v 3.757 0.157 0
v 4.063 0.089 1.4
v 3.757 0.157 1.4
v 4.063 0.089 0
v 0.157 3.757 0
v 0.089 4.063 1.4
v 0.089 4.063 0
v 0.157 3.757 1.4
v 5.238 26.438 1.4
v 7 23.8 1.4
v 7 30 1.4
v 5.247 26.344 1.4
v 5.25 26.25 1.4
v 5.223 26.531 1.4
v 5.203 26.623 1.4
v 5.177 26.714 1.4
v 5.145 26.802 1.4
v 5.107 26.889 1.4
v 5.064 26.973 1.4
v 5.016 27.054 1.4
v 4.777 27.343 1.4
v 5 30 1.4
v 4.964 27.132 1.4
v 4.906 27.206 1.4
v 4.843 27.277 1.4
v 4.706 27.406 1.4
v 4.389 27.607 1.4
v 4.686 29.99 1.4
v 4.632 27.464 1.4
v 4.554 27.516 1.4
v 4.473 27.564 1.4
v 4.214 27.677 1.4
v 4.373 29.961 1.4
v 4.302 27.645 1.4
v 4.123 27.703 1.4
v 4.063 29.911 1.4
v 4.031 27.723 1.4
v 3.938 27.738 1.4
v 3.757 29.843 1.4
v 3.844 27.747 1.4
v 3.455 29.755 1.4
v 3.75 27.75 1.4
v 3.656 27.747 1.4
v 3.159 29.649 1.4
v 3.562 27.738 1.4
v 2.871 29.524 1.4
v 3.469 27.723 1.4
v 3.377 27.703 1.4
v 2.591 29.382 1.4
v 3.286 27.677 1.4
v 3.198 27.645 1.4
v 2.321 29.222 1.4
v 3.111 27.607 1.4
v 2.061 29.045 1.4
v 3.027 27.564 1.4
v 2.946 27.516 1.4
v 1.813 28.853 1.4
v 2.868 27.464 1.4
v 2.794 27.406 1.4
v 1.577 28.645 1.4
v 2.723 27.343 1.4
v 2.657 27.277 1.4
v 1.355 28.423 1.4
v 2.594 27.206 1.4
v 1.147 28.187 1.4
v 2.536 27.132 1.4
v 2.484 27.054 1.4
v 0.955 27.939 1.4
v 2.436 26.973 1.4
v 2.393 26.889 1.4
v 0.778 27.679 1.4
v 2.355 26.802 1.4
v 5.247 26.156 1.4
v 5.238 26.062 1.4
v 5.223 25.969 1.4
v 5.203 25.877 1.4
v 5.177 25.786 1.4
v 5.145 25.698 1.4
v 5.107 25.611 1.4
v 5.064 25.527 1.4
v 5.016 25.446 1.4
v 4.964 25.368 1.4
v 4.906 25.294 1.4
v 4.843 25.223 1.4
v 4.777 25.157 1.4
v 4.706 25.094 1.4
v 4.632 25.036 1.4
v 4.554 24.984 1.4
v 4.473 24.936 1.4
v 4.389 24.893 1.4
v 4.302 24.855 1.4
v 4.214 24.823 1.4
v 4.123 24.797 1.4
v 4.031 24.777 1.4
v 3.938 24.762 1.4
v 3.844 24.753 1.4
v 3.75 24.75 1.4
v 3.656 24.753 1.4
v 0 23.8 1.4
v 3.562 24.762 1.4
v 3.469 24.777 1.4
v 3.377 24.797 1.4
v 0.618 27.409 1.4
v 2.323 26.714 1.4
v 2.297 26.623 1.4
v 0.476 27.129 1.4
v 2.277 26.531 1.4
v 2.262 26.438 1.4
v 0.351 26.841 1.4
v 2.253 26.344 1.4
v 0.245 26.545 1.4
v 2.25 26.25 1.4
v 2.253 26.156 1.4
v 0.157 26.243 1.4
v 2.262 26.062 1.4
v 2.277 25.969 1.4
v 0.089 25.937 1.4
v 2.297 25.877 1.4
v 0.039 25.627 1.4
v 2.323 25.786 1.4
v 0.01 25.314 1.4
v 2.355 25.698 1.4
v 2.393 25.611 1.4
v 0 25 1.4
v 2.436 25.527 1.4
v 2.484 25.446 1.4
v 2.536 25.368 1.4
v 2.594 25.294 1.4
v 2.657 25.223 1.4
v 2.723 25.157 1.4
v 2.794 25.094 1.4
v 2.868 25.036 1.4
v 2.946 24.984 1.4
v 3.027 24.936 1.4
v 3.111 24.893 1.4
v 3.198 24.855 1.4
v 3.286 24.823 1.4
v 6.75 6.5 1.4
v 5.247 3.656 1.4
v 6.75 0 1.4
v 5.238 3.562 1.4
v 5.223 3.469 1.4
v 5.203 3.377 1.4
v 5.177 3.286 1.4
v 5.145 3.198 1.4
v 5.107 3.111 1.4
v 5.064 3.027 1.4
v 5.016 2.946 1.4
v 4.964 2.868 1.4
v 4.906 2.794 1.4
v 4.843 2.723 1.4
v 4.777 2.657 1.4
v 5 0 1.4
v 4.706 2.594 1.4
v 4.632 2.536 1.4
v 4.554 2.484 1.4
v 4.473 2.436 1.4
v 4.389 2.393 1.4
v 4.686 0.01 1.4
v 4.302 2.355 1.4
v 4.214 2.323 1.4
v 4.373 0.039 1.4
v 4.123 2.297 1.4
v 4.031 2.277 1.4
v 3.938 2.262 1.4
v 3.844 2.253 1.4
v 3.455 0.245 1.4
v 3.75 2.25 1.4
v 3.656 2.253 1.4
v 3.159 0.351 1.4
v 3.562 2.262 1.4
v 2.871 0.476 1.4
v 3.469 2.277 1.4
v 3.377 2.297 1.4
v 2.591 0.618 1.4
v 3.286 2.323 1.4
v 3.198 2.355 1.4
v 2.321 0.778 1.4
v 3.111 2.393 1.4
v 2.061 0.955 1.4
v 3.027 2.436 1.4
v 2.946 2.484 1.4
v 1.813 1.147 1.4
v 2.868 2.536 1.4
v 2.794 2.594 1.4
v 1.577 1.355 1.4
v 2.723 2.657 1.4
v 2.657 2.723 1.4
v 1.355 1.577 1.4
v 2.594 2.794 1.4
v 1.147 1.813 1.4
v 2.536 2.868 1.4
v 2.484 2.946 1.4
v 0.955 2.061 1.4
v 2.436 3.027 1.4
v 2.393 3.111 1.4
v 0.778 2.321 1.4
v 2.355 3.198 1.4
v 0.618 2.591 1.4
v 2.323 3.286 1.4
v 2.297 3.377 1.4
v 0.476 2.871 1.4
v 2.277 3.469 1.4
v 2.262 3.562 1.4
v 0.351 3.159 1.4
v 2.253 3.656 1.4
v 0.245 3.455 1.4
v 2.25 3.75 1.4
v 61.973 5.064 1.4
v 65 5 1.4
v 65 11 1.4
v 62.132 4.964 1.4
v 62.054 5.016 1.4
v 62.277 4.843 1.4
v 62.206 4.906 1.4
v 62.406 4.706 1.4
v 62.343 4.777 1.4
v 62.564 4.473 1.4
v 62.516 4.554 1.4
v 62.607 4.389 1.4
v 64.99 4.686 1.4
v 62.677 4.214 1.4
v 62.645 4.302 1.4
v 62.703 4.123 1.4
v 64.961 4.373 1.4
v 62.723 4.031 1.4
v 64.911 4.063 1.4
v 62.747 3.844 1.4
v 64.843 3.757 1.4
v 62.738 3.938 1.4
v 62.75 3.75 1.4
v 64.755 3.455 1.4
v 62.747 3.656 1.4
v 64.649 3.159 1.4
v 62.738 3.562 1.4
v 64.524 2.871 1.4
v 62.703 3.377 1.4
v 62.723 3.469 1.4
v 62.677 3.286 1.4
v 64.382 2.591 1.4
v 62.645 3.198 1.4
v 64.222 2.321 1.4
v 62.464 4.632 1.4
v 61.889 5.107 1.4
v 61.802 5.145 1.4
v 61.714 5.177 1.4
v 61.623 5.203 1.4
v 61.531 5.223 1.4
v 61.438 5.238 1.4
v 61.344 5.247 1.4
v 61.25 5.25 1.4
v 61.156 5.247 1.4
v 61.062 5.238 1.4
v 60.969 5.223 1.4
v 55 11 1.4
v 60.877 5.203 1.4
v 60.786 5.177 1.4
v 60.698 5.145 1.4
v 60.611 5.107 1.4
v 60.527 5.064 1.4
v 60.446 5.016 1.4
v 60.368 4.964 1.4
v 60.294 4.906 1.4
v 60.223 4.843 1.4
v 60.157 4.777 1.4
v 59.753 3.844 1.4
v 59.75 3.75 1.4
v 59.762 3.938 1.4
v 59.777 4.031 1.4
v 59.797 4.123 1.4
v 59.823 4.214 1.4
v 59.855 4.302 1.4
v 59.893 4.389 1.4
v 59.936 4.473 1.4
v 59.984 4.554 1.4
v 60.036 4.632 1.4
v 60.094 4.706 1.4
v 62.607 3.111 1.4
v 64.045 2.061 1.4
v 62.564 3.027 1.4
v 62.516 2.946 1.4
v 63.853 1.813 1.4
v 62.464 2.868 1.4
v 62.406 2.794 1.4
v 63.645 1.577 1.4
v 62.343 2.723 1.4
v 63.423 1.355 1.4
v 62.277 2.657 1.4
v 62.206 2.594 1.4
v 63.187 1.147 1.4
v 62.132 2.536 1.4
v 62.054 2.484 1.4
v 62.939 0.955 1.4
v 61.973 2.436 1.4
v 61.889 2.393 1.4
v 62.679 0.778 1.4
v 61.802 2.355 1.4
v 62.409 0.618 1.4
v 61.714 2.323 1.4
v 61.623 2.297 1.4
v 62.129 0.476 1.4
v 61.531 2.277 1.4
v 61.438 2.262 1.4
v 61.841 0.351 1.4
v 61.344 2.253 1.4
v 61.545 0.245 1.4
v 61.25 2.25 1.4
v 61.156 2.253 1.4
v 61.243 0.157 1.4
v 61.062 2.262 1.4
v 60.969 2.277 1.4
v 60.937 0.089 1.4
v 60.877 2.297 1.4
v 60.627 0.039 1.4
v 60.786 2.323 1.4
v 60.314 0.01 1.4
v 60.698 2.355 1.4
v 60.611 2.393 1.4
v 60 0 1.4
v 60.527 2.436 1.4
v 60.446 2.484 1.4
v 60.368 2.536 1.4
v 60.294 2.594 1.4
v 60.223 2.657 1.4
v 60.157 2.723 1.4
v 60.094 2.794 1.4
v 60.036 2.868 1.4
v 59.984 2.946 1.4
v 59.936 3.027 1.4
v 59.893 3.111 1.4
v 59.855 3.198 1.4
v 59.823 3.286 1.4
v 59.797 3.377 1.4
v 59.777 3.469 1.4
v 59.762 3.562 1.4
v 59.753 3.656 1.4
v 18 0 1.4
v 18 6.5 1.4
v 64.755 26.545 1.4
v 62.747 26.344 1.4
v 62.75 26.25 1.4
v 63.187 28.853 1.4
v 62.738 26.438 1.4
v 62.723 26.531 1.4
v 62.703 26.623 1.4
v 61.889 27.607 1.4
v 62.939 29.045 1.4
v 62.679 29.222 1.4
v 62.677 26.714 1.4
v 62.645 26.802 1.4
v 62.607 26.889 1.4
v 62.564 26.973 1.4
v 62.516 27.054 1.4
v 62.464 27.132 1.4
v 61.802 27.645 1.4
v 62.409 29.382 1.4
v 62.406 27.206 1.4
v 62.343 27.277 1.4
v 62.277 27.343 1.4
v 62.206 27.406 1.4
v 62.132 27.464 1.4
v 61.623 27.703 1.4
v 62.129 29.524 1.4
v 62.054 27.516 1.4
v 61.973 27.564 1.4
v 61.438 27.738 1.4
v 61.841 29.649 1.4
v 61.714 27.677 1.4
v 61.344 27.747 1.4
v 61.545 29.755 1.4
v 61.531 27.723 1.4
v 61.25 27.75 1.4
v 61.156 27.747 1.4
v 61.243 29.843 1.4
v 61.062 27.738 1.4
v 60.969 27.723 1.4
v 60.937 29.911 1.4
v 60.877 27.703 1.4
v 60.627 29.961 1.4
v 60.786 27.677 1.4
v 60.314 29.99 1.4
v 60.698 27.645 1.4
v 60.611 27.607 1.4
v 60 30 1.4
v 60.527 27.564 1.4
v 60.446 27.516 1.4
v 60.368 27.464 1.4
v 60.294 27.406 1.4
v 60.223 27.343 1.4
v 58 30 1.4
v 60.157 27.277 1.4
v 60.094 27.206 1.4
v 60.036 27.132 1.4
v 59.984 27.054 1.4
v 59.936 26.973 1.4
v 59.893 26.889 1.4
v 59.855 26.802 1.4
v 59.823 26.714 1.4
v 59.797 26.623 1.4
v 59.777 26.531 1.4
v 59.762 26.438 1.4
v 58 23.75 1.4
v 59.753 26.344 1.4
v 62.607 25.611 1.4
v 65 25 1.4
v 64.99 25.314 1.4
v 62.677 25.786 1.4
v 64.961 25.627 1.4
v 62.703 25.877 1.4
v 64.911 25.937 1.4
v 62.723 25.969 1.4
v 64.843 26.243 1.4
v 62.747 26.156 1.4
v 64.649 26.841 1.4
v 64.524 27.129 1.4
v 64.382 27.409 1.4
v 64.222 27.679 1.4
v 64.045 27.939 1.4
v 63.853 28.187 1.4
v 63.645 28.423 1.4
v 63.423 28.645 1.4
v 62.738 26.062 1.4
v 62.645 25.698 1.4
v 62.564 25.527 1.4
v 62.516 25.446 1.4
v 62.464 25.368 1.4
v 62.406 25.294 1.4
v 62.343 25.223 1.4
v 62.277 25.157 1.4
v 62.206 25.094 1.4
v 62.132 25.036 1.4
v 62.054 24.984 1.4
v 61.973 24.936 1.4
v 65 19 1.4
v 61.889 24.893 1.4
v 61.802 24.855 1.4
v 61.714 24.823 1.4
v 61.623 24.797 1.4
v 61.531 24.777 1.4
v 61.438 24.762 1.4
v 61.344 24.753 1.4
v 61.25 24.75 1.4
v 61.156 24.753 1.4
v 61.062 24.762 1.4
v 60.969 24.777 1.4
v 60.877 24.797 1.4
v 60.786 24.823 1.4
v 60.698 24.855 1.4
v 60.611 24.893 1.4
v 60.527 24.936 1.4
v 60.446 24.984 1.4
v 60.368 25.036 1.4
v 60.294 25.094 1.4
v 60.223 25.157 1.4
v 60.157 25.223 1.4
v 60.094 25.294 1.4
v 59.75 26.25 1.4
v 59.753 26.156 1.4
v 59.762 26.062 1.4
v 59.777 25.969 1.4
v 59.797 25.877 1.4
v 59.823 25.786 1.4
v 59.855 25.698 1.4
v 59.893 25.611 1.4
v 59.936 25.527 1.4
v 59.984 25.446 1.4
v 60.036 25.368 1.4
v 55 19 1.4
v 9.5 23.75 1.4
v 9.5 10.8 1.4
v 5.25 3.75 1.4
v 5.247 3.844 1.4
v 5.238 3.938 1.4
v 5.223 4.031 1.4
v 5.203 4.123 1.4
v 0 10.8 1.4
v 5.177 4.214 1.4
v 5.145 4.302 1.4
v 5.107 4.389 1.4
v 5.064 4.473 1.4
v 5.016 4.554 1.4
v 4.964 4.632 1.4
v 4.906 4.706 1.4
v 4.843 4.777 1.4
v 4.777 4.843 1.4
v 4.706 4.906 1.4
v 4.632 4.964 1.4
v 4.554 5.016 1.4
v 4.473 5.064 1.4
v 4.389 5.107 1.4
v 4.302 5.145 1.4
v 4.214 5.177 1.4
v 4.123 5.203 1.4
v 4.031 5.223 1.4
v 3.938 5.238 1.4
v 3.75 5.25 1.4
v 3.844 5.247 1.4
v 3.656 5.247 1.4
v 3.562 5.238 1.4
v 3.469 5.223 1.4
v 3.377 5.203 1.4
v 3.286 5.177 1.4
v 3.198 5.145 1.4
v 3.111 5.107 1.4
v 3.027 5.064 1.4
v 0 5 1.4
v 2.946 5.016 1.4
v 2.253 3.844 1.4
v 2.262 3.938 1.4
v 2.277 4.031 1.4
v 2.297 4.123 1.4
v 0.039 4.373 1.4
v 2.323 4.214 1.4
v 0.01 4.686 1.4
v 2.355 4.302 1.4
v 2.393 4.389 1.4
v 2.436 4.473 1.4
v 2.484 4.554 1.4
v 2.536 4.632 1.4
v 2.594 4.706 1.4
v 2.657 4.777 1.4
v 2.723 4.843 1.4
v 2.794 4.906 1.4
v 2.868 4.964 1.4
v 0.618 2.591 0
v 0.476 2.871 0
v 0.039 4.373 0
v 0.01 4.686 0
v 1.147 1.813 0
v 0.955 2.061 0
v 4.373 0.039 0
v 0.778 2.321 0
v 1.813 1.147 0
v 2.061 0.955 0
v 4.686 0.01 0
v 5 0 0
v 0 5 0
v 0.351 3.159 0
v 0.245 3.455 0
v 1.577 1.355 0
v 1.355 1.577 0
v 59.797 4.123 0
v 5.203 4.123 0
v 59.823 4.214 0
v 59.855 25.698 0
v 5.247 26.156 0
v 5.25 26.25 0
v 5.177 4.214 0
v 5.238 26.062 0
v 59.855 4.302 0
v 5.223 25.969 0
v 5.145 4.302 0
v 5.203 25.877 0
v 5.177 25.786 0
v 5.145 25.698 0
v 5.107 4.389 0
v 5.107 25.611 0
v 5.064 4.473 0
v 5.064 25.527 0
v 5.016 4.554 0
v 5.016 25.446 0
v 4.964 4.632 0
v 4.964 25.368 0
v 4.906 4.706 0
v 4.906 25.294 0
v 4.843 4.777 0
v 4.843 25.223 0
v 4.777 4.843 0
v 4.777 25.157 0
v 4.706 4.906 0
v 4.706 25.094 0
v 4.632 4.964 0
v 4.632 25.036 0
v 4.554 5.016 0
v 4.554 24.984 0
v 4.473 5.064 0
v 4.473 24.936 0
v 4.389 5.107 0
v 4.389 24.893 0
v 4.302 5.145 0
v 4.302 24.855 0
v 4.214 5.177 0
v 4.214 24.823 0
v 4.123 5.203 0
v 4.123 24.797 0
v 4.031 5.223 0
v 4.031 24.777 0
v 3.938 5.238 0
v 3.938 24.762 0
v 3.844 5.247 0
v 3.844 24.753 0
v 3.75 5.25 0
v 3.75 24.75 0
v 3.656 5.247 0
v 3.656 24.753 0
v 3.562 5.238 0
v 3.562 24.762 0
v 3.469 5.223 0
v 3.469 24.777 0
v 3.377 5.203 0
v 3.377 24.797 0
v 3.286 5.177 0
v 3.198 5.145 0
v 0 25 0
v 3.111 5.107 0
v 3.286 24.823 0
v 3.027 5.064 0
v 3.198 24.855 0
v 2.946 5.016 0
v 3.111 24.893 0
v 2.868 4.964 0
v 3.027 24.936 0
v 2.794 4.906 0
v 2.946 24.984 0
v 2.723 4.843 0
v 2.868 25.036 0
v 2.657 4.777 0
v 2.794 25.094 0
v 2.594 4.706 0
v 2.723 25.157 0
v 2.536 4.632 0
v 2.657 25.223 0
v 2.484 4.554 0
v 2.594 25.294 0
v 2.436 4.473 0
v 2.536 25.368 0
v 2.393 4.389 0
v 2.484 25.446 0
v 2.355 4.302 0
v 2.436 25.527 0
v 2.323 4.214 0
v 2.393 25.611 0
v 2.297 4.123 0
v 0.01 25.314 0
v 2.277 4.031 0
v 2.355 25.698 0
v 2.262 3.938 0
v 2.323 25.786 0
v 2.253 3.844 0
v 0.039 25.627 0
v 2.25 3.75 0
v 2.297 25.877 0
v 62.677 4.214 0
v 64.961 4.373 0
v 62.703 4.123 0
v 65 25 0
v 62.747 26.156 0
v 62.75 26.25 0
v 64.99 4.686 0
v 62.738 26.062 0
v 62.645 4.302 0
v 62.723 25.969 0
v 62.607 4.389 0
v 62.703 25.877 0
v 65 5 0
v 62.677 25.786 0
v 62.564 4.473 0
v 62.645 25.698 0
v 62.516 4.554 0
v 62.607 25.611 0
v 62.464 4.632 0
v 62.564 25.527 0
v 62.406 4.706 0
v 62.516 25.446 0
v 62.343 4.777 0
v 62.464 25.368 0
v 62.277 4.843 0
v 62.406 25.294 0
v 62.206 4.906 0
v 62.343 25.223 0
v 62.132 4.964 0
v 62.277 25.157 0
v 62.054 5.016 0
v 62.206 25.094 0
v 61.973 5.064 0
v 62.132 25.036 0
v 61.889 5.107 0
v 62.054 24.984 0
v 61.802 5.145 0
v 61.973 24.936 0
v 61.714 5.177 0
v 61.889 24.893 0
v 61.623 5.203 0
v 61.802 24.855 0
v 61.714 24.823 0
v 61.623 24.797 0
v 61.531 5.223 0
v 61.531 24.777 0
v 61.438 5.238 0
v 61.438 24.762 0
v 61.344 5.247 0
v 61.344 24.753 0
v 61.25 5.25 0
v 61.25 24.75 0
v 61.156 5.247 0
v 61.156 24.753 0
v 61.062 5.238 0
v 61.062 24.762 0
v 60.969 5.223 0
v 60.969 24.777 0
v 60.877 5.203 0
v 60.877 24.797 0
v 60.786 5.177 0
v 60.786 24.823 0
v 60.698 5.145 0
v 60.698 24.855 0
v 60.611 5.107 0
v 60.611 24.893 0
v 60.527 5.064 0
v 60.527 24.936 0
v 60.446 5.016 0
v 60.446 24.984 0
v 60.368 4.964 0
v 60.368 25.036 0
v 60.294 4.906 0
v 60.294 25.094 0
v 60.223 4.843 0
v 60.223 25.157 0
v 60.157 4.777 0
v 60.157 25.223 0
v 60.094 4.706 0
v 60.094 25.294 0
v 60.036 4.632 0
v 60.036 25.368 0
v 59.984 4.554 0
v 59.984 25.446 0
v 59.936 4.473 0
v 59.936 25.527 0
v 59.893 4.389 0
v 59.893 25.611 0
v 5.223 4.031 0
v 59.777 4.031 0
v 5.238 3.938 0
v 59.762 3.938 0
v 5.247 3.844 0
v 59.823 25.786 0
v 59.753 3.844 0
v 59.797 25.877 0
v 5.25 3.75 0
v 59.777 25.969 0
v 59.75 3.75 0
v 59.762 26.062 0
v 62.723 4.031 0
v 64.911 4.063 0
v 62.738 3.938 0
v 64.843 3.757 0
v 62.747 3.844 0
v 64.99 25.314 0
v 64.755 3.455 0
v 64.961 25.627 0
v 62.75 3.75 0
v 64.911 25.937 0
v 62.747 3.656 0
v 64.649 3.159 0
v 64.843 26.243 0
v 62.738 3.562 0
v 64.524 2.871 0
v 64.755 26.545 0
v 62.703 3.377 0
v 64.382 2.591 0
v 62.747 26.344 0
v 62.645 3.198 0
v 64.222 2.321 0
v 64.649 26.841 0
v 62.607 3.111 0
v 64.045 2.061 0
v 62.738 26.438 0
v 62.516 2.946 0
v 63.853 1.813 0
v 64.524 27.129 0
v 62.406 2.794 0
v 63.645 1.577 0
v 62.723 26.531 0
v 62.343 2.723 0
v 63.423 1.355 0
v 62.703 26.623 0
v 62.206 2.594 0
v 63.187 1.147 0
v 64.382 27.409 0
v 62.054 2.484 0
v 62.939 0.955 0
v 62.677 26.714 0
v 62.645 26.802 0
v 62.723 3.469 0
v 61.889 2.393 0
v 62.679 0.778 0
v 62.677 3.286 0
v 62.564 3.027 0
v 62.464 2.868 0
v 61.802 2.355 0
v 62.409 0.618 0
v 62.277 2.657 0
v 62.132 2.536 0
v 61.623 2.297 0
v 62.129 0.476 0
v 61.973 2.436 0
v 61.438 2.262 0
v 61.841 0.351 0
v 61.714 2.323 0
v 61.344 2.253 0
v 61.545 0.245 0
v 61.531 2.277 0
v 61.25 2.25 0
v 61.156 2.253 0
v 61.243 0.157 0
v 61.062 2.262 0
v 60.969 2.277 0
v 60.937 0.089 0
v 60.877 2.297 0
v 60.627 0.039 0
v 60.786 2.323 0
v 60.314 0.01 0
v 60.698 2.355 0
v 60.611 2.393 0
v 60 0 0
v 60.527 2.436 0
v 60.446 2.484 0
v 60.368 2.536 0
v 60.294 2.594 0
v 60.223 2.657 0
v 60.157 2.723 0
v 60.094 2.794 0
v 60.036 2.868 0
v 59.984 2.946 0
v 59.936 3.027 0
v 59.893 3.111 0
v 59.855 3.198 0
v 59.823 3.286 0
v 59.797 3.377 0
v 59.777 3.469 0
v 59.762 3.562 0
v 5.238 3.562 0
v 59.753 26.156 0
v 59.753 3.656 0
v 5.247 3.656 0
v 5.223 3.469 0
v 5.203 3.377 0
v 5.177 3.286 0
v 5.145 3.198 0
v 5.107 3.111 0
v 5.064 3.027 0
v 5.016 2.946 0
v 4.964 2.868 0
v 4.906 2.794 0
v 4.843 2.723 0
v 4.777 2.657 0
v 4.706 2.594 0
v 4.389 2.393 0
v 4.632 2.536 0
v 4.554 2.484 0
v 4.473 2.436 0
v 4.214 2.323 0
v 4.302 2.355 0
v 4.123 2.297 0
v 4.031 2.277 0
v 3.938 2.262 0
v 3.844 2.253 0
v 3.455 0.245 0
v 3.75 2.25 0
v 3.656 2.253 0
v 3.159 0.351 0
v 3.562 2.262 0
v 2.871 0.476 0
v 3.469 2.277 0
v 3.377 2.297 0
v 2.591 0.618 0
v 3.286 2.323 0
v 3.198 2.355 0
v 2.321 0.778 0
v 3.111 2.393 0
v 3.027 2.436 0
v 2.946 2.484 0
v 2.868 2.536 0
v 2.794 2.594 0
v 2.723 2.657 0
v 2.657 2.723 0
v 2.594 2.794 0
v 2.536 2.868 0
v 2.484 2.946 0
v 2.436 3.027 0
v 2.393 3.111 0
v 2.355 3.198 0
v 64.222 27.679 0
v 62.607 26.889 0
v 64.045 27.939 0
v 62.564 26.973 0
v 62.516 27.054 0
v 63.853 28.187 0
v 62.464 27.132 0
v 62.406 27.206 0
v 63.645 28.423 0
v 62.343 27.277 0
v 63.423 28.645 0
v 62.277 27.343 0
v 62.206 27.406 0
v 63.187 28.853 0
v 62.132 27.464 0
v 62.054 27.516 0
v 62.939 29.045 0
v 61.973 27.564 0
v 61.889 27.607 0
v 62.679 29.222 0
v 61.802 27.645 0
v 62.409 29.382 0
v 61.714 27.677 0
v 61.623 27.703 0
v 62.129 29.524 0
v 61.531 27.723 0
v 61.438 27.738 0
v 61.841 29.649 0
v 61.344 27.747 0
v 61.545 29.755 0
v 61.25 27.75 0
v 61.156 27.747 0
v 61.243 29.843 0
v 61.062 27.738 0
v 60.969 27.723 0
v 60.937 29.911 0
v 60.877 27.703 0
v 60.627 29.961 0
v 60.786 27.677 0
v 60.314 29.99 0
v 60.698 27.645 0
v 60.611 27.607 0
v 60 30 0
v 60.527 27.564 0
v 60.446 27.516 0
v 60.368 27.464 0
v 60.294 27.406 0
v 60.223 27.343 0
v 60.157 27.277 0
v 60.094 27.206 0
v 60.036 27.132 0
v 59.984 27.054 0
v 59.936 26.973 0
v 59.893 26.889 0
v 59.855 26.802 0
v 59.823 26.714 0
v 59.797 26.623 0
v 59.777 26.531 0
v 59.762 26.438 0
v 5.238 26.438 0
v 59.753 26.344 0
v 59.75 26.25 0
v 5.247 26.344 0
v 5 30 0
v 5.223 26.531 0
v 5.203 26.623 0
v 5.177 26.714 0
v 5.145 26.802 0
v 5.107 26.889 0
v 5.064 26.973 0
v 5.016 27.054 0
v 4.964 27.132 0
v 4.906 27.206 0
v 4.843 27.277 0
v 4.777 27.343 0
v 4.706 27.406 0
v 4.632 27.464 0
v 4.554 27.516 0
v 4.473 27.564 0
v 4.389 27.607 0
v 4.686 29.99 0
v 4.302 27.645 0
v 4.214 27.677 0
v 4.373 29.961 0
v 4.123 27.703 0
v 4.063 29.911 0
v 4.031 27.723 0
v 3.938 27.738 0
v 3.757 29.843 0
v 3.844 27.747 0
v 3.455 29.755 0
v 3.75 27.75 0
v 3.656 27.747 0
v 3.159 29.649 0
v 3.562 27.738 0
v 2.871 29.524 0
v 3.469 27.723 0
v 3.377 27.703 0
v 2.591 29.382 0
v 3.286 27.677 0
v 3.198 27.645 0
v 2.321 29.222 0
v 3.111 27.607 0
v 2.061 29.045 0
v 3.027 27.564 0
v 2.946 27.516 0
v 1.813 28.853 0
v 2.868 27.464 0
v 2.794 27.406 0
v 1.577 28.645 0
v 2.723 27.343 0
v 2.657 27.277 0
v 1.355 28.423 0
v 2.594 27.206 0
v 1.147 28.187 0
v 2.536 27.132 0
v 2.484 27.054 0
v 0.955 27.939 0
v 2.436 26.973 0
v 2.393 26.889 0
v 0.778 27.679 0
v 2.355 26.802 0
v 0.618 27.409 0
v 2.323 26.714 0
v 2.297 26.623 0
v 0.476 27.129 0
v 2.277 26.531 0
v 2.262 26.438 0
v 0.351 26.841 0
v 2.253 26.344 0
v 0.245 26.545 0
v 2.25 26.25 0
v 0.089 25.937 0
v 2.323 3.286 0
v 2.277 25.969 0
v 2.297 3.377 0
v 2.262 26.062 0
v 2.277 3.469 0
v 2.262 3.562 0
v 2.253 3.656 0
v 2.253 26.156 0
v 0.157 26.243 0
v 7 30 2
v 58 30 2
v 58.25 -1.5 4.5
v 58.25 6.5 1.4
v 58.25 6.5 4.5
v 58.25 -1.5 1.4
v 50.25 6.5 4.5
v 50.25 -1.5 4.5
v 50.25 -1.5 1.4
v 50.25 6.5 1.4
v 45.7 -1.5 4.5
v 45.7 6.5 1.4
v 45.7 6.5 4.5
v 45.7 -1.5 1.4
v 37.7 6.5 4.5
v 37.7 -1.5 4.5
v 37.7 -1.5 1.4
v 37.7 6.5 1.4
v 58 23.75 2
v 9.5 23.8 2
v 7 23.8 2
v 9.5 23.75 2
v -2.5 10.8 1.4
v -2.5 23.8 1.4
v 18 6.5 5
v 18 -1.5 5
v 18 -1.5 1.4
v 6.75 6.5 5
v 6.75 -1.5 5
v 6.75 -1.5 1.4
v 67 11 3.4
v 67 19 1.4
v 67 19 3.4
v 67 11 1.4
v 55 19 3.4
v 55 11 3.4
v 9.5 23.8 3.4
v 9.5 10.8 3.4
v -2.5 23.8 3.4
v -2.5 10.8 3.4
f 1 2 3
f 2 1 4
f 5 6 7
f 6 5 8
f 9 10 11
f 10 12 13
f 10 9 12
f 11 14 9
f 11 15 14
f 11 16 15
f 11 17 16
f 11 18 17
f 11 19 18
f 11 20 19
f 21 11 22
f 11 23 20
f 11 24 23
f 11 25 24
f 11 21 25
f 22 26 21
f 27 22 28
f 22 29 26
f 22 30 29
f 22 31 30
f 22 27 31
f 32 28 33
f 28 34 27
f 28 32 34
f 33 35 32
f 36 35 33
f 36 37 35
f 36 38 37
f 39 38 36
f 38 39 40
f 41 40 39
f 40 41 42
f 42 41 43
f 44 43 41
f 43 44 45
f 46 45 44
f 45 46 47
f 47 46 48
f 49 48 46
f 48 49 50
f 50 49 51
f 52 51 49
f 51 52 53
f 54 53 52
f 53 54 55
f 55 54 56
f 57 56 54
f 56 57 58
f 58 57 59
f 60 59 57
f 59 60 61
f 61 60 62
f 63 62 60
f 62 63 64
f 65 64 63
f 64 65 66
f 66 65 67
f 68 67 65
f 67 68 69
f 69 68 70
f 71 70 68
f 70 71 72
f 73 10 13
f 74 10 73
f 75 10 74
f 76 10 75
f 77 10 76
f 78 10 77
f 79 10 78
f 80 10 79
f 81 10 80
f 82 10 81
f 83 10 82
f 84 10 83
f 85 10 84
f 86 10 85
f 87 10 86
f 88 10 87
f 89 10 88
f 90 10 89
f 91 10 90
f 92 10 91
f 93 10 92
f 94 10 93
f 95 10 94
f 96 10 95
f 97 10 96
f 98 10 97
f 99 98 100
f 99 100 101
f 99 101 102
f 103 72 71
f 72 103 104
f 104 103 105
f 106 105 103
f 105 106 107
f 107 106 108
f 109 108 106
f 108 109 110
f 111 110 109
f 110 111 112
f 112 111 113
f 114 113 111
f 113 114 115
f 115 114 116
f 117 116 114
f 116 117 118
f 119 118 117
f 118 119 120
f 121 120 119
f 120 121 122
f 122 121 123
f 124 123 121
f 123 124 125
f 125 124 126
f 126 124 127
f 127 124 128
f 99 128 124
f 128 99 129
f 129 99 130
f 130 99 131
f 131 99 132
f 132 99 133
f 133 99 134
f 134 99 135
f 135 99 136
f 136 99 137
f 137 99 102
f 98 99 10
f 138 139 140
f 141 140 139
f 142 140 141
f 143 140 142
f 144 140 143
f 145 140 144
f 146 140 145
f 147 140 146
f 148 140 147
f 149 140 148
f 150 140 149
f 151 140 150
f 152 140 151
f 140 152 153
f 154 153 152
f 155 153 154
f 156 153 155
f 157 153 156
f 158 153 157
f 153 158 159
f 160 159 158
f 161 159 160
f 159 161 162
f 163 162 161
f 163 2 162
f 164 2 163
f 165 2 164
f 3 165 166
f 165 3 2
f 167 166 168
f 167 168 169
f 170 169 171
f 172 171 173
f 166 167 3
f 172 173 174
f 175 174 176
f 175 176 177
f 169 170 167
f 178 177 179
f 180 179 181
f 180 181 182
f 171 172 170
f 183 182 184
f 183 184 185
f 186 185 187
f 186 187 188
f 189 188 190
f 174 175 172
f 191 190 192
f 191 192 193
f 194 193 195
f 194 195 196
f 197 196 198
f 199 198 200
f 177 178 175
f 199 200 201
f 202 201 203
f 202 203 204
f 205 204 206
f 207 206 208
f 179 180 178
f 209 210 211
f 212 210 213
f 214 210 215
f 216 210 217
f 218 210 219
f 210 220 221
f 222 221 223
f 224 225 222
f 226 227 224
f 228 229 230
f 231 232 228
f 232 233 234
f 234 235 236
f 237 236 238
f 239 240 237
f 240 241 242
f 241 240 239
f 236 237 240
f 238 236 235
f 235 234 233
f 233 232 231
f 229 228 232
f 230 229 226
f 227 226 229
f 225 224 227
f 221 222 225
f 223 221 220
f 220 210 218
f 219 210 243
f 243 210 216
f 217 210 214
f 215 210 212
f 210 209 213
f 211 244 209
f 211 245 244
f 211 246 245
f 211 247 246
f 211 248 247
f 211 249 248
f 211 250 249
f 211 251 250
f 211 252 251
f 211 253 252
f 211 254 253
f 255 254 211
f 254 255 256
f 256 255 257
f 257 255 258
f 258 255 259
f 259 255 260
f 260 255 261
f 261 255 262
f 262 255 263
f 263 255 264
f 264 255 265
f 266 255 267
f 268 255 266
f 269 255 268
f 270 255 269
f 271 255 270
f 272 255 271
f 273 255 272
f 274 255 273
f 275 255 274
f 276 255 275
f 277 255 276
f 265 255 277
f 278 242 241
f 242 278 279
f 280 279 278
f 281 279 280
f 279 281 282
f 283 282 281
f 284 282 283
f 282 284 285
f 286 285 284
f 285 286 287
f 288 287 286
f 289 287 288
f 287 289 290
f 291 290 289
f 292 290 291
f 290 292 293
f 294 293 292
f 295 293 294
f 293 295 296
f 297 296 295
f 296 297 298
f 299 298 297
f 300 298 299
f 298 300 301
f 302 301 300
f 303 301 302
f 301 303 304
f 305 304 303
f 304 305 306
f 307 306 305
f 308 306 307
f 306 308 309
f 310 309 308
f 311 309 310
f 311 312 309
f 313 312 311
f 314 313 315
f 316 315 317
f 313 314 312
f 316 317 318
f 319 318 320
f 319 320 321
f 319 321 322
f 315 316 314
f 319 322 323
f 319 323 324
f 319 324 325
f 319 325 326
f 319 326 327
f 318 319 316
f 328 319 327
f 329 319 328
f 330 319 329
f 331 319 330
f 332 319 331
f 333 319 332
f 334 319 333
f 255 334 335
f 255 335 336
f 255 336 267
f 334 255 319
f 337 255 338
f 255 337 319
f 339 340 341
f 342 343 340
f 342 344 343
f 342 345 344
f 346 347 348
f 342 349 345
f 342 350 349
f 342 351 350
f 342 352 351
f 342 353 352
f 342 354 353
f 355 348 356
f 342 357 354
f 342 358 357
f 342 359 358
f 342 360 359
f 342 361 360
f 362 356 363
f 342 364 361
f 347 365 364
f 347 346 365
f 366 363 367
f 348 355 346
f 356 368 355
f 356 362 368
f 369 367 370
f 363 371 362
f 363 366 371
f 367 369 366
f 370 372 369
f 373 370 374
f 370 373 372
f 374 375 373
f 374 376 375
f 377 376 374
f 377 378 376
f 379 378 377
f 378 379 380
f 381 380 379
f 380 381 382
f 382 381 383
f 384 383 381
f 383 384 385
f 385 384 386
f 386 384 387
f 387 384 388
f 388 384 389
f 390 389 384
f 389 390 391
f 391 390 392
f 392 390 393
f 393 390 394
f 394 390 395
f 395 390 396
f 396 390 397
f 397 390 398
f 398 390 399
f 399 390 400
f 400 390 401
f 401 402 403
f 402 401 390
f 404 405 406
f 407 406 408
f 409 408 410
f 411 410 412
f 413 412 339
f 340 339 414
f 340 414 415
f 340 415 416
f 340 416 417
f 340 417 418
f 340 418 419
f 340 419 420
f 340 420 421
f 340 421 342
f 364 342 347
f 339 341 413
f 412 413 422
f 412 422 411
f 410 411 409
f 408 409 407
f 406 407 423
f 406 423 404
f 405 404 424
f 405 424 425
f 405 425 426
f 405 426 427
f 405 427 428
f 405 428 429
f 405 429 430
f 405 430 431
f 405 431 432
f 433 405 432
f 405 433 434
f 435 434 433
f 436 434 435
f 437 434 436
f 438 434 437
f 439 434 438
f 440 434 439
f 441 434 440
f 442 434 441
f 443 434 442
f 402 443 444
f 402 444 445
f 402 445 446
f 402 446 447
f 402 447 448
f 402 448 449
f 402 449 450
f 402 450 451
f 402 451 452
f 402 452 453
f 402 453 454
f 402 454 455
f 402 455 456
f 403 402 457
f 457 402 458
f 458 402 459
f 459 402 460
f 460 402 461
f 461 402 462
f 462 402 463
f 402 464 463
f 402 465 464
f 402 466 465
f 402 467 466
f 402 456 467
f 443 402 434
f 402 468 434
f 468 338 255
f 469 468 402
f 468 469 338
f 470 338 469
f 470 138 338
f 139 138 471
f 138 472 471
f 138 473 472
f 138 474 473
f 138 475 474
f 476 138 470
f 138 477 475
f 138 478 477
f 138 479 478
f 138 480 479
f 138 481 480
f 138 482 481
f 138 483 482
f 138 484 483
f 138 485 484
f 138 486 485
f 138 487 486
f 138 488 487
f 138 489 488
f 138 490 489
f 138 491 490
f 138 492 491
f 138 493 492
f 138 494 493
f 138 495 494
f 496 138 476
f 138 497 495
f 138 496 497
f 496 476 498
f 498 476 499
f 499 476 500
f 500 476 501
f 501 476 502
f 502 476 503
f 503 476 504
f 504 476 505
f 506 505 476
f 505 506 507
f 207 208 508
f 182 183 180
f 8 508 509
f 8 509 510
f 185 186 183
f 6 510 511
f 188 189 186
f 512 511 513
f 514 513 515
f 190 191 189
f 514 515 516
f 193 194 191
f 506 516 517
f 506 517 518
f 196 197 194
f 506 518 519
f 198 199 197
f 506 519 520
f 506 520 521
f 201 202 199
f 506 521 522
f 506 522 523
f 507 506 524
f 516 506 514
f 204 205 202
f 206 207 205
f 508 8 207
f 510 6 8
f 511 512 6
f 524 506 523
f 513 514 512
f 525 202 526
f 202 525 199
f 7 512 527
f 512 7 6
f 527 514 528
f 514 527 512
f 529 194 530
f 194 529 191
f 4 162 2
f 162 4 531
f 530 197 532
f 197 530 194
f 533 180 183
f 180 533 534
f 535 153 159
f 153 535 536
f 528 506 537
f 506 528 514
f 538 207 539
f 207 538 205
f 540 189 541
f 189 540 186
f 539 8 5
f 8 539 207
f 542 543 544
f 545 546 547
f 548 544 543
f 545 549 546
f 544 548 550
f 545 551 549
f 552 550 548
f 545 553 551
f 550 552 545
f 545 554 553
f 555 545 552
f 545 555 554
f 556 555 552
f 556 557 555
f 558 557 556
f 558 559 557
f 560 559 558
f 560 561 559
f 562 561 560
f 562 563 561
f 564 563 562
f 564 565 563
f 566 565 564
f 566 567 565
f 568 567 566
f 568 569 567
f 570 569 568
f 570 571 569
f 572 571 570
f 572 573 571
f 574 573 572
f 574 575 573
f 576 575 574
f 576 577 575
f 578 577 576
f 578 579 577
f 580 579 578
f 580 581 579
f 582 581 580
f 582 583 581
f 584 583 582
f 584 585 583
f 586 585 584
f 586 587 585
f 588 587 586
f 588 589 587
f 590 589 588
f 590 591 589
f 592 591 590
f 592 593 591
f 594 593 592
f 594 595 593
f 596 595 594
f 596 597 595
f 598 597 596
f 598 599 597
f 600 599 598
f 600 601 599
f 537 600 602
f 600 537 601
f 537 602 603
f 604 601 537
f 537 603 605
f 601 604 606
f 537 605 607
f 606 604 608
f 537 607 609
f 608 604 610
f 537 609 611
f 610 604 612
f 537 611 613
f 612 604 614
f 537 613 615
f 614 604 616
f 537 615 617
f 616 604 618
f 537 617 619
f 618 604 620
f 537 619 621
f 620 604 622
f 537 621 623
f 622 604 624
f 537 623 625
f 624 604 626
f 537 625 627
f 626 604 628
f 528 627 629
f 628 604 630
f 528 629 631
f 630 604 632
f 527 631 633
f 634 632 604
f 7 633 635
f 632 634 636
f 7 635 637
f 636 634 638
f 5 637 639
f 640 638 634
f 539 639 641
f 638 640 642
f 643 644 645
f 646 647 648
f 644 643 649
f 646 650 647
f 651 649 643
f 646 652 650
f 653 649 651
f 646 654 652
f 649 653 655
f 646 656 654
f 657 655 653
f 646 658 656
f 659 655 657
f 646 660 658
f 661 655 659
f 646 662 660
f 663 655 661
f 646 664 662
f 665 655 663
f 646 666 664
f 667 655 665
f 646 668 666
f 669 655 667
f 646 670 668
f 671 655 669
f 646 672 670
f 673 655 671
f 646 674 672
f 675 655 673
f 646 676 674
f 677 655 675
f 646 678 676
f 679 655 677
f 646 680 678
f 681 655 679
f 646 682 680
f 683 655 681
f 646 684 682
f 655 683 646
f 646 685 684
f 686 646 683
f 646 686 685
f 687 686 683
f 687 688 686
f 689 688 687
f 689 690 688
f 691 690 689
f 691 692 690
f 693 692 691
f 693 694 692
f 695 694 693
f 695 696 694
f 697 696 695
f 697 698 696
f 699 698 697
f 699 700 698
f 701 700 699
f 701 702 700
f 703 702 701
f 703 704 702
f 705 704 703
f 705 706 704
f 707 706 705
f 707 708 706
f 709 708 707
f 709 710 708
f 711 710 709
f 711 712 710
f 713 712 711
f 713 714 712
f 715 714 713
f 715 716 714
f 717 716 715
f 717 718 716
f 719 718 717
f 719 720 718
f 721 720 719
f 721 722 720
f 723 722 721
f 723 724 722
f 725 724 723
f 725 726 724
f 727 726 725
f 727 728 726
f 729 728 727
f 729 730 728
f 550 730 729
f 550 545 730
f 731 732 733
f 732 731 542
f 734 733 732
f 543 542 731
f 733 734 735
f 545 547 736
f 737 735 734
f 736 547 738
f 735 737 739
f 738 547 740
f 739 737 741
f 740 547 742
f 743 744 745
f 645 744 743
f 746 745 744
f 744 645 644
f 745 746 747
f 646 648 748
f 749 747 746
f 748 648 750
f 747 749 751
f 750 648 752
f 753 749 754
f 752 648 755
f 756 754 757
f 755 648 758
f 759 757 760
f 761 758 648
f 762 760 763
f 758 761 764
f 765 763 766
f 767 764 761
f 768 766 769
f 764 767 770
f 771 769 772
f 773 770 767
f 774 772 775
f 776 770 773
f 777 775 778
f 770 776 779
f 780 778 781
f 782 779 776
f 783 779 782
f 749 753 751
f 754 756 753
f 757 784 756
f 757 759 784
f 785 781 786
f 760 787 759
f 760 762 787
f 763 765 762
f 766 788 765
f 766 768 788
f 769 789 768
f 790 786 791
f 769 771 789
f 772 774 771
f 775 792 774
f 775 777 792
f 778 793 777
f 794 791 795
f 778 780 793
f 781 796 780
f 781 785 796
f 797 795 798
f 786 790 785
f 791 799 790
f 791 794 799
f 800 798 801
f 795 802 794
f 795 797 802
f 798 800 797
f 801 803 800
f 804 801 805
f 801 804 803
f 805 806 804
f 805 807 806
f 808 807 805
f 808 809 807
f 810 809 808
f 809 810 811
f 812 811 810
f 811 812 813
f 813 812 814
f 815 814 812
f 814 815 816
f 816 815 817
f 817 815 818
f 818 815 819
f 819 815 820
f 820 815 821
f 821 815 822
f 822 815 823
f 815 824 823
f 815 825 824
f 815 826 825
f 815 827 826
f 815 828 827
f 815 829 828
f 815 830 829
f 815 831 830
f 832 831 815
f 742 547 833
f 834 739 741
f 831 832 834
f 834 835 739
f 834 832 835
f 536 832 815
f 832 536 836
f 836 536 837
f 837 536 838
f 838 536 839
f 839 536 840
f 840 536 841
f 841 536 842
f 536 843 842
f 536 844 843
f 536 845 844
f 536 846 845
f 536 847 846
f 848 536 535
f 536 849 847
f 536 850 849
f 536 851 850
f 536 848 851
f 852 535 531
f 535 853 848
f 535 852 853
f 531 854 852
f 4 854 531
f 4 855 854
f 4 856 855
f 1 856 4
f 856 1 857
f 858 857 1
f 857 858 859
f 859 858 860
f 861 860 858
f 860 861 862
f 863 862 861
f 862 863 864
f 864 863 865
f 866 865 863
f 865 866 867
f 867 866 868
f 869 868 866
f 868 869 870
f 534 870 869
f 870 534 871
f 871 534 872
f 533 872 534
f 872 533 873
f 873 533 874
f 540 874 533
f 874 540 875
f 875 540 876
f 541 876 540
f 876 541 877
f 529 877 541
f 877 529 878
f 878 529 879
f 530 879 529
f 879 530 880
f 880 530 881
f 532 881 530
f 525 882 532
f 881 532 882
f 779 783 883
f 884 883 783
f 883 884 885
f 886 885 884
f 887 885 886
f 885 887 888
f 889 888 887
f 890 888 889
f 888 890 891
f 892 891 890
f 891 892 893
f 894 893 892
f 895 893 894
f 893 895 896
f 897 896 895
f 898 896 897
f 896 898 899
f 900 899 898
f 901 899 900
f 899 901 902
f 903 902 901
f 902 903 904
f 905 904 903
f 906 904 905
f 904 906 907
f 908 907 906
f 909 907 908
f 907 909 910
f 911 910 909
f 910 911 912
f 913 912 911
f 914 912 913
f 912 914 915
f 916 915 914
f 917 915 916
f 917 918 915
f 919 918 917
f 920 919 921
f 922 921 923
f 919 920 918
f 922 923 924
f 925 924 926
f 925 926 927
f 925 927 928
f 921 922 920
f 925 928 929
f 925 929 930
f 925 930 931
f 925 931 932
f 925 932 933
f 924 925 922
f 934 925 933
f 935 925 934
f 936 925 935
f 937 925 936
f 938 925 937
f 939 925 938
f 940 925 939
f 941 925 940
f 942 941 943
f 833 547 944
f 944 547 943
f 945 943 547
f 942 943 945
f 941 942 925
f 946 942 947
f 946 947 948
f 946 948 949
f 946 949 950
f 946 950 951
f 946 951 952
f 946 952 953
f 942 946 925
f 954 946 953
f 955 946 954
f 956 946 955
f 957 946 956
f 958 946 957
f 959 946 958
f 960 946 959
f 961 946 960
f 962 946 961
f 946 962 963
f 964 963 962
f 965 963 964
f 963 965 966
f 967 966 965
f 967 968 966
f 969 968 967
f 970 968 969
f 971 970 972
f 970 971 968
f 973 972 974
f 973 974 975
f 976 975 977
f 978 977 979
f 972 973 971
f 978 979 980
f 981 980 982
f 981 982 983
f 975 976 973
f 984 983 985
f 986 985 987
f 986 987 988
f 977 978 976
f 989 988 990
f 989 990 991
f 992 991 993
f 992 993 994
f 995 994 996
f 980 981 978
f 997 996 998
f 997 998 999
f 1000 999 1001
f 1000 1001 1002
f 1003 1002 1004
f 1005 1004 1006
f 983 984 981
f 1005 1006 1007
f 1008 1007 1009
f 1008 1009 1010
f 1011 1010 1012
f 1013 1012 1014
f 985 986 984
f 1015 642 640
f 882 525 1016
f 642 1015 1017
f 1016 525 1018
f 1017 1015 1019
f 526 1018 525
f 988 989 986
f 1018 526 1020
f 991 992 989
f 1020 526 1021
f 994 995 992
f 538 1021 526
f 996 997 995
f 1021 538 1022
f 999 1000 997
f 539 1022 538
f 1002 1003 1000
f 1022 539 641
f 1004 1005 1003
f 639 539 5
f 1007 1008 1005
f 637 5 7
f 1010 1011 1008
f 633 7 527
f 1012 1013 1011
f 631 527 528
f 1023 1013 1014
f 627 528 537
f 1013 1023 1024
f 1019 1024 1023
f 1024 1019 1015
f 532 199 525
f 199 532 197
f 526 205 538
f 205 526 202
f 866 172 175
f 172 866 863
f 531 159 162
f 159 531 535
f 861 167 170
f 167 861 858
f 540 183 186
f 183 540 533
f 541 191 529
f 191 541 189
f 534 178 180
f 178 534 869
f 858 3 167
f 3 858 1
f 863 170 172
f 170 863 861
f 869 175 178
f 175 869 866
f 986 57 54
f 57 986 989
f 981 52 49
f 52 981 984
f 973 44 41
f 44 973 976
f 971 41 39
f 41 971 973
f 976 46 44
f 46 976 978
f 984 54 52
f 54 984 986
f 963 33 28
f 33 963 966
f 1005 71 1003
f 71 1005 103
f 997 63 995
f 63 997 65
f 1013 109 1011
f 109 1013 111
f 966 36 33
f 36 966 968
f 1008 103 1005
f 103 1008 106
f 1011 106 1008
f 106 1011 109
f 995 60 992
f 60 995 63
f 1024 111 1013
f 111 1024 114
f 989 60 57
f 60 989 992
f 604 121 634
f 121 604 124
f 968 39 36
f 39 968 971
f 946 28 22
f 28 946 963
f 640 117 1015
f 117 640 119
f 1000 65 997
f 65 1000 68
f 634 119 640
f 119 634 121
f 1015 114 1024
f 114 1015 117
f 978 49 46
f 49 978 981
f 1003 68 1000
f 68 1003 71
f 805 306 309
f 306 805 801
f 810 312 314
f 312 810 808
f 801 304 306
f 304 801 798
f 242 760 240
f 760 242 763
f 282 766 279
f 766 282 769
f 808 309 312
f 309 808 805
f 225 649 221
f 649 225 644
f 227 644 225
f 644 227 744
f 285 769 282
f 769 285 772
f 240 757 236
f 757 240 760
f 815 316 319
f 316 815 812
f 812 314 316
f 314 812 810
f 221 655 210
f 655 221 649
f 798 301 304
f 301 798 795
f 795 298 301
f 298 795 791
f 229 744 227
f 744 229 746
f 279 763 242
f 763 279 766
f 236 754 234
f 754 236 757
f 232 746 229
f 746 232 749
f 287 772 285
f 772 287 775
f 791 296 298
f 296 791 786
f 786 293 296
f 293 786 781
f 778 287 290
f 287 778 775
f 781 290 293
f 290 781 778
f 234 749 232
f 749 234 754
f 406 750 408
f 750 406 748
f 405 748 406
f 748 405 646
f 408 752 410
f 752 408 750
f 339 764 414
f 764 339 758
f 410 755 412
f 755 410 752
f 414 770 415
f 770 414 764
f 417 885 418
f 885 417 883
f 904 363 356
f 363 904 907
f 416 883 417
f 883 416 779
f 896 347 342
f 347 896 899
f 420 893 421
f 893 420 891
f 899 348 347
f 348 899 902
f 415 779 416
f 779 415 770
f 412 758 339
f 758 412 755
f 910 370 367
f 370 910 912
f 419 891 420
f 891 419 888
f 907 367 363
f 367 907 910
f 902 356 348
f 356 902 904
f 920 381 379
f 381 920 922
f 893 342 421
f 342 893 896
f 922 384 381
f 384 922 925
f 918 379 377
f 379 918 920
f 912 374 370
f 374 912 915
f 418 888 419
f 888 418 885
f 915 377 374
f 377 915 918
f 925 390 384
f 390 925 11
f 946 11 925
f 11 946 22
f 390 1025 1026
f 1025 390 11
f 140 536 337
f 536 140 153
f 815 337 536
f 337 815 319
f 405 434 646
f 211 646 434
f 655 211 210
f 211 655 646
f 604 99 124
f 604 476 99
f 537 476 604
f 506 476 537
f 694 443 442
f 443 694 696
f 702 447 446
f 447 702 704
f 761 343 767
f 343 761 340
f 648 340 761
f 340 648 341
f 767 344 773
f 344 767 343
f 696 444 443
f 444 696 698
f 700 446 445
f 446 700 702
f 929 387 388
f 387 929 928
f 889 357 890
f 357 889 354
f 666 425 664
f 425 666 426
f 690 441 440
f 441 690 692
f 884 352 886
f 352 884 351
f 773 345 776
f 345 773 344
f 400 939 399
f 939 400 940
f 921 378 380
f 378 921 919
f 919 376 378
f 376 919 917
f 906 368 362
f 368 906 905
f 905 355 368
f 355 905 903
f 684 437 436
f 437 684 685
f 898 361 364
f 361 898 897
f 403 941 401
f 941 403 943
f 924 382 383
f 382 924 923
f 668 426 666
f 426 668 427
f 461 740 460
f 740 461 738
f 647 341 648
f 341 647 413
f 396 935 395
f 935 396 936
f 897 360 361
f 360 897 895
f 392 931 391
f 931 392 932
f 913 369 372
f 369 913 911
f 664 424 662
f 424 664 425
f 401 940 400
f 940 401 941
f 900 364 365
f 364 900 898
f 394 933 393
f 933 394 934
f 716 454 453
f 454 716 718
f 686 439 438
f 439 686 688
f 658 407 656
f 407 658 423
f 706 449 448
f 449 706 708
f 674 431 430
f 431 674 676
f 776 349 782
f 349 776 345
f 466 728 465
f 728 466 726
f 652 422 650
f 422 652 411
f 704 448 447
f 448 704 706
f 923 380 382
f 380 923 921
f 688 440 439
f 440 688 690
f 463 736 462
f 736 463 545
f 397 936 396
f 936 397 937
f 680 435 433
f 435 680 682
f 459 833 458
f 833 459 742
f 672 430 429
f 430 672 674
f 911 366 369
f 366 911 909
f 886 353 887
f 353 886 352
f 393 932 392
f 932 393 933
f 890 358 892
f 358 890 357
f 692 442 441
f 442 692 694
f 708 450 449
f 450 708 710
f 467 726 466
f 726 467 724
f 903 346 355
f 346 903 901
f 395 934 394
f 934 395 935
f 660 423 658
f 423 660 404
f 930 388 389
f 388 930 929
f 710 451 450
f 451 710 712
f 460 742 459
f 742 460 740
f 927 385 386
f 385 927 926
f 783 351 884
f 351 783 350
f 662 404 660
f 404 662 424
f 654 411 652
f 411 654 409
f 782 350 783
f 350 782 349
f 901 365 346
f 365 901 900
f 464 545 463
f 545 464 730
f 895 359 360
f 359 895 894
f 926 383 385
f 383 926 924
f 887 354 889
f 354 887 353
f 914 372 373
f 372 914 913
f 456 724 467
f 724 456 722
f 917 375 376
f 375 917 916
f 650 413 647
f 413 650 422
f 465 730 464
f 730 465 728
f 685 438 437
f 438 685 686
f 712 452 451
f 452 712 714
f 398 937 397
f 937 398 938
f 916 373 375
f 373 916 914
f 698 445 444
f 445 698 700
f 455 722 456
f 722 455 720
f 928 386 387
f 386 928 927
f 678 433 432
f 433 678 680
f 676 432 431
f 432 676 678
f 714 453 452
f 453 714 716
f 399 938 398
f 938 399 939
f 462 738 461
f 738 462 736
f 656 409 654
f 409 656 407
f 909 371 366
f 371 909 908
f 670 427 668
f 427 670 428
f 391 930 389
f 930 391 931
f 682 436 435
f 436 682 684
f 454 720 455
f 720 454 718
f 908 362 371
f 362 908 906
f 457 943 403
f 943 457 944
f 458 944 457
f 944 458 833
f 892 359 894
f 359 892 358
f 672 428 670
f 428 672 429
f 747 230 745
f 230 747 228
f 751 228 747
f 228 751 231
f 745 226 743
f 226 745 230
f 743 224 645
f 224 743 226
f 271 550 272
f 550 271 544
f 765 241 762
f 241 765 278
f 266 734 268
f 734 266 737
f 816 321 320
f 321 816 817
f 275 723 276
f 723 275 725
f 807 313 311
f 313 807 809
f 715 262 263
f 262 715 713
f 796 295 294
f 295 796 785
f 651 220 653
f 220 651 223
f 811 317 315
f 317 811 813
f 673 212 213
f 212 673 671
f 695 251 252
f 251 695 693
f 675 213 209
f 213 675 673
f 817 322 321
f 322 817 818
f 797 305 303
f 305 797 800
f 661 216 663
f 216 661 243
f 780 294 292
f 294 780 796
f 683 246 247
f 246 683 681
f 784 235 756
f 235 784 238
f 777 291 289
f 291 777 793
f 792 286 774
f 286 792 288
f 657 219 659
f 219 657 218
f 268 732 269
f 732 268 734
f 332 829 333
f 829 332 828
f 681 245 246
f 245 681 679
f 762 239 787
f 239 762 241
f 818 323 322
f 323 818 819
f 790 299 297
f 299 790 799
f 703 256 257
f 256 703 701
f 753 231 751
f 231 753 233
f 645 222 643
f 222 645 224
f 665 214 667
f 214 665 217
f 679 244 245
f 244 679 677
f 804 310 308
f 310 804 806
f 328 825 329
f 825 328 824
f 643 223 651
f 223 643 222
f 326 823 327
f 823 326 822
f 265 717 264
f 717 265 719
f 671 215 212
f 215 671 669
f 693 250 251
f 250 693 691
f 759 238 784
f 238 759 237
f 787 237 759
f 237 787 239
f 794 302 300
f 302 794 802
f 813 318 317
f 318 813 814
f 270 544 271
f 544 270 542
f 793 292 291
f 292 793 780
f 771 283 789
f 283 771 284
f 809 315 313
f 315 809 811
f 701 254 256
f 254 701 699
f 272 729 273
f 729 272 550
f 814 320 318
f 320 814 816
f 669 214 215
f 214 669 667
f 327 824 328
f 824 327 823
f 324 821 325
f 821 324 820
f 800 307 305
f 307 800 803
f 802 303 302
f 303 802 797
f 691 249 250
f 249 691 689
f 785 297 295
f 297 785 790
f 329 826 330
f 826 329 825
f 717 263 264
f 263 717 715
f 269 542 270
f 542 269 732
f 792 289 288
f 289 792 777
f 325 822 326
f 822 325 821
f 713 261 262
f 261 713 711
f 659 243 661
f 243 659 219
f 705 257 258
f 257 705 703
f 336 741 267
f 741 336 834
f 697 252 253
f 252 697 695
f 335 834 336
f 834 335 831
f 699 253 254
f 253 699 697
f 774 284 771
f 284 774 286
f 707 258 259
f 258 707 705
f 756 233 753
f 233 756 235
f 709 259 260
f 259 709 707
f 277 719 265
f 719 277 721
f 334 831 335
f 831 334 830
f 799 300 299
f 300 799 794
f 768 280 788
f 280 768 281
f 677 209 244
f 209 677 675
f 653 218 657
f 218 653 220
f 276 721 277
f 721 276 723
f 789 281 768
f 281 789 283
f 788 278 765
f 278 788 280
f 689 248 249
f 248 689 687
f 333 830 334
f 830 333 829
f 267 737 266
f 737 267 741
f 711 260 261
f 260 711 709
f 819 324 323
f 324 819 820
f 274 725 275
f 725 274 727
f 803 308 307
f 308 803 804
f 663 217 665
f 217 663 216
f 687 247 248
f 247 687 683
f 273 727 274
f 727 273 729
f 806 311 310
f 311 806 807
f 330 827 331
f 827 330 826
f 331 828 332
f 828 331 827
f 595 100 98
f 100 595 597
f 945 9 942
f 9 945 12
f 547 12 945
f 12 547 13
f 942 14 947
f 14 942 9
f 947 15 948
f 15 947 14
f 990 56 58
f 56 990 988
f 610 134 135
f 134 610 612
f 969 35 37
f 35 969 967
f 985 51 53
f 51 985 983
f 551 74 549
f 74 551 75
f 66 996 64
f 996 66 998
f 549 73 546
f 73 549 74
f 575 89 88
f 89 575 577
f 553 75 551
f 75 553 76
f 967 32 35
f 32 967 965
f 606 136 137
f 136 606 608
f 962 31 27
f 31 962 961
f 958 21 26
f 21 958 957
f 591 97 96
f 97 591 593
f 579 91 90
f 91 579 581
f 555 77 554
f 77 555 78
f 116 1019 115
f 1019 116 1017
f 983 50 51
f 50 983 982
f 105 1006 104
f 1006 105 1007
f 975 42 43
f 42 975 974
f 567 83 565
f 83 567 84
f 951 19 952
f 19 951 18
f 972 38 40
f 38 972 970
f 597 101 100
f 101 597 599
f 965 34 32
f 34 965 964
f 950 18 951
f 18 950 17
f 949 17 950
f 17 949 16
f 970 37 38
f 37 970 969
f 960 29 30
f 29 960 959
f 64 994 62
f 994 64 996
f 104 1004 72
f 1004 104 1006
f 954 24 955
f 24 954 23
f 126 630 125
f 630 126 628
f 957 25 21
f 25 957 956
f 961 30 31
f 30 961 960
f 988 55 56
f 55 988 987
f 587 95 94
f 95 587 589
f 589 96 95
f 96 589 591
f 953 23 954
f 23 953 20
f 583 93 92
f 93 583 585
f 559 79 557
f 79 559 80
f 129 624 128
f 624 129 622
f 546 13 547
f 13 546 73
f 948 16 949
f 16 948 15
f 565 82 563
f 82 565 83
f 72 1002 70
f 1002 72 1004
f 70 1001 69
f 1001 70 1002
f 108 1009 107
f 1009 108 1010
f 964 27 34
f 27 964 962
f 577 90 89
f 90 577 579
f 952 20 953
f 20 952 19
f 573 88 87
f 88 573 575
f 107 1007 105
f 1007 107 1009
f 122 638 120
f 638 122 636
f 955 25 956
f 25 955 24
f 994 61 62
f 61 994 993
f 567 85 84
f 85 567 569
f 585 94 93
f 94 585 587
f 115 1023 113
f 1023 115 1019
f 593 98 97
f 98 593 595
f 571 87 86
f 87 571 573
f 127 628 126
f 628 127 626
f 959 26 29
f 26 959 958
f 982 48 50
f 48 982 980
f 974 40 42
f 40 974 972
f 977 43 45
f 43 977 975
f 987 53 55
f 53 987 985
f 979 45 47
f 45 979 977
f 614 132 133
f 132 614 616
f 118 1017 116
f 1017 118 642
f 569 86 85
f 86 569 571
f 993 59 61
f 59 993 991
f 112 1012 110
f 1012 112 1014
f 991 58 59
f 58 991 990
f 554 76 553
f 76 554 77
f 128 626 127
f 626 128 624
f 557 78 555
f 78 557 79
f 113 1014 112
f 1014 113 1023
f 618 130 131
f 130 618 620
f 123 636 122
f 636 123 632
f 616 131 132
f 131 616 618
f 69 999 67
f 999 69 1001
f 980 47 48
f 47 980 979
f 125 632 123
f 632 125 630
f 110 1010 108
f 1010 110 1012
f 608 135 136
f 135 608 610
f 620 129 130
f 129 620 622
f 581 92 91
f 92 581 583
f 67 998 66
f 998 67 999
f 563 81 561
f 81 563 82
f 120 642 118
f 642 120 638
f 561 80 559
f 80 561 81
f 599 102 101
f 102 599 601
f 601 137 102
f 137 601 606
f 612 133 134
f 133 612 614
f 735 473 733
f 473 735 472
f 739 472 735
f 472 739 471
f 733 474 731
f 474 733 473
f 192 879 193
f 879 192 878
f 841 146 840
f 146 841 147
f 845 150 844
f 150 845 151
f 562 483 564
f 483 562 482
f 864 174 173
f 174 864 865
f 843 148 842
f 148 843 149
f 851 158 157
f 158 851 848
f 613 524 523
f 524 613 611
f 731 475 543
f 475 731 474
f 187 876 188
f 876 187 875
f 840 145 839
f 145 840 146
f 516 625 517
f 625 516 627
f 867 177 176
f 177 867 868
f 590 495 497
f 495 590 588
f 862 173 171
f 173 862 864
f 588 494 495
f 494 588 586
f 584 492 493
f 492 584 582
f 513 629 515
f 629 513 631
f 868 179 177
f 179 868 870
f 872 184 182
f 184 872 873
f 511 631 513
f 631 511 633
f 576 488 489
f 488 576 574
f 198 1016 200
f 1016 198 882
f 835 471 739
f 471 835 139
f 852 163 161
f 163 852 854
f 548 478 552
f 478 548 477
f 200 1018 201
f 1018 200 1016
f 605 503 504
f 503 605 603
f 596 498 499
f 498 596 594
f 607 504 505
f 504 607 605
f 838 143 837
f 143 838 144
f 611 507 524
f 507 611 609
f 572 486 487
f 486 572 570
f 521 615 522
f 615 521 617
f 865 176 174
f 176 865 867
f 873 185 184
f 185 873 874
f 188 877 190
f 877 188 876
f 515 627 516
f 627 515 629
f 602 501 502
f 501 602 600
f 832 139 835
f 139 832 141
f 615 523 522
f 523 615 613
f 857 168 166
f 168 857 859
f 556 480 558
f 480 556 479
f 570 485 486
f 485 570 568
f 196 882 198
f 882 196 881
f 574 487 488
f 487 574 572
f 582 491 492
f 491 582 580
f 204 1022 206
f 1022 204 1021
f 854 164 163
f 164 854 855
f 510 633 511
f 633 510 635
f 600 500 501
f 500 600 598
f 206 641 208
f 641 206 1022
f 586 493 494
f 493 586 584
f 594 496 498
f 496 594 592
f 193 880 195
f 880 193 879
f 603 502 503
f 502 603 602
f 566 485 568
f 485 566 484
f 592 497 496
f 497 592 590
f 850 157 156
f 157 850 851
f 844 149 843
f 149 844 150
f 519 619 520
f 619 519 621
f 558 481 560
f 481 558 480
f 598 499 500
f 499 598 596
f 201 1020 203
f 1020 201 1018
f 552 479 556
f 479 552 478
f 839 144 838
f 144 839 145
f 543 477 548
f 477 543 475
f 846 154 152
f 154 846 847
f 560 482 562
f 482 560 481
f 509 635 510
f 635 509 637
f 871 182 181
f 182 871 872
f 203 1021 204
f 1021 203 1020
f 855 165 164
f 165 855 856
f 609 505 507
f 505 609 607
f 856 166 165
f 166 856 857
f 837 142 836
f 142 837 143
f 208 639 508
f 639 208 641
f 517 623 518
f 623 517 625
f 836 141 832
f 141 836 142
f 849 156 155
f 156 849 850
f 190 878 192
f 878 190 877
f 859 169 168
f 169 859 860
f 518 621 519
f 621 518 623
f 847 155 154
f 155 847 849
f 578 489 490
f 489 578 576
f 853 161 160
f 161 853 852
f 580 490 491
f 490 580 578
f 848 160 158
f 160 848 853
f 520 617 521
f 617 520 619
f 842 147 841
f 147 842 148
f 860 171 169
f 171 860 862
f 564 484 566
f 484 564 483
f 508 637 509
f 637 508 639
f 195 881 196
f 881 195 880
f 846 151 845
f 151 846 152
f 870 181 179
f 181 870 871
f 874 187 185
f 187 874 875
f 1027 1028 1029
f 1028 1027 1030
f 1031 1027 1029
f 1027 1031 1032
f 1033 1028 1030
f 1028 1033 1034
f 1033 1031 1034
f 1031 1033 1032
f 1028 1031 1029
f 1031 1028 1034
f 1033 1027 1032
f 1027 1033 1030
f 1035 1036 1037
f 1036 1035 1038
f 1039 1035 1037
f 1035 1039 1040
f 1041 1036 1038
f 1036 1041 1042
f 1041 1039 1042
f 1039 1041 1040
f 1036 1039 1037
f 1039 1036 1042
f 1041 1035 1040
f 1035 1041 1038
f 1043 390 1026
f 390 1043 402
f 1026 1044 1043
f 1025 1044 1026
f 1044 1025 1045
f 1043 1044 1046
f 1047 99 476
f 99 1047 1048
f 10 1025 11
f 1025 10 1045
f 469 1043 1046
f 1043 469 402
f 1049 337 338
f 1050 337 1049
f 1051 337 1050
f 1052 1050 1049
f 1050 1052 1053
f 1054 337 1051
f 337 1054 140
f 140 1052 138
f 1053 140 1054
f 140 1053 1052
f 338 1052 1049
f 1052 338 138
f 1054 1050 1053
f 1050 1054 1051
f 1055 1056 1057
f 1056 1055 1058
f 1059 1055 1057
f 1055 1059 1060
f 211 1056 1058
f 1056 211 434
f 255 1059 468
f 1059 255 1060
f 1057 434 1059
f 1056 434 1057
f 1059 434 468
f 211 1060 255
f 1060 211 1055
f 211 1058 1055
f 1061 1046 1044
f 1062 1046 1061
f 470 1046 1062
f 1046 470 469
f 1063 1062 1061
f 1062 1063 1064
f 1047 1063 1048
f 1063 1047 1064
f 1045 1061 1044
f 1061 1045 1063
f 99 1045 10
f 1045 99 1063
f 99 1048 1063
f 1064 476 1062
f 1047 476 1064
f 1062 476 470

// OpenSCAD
use <MCAD/boxes.scad>

pi_x=65;
pi_x_pad=4.5;
pi_y=30;
pi_y_pad=1.5;
pi_z=1.4;
pi_z_pad=2.25;
pi_board_z=1.4;
pi_pcbs_z=1.8;

pi_gpio_x=51;
pi_gpio_y=6.25;
pi_gpio_z=.6;

pi_screw_r=3/2;
pi_screw_inset=2.25;

pi_usb_overhang=1.5;
pi_usb_x=8;
pi_usb_y=8;
pi_usb_z=3.1;

pi_hdmi_overhang=1.5;
pi_hdmi_x=11.25;
pi_hdmi_y=8;
pi_hdmi_z=3.6;

pi_cam_overhang=2;
pi_cam_x=12;
pi_cam_y=8;
pi_cam_z=2;

pi_sd_overhang=2.5; 
pi_sd_x=12;
pi_sd_y=13;
pi_sd_y_offset=10.8;
pi_sd_z=2;

union(){
    //color("green") cube([pi_x,pi_y,pi_z]);
    /*
     *  PCB Base
     */
    translate([pi_x/2,pi_y/2,pi_z/2]){
        difference(){
            roundedBox([pi_x, pi_y, pi_z], 5, true, $fn=100); 
           
            translate([(pi_x/2)-pi_screw_inset-pi_screw_r,
                        (pi_y/2)-pi_screw_inset-pi_screw_r,
                        -(pi_z/2)-.25]){
                color("cyan")
                cylinder (h=pi_z+.5, r=pi_screw_r,$fn=100);
            }
            
            translate([(pi_x/2)-pi_screw_inset-pi_screw_r,
                       -(pi_y/2)+pi_screw_inset+pi_screw_r,
                       -(pi_z/2)-.25]){
                color("cyan")
                cylinder (h=pi_z+.5, r=pi_screw_r,$fn=100);
            }
            
            translate([(-pi_x/2)+pi_screw_inset+pi_screw_r,
                        (pi_y/2)-pi_screw_inset-pi_screw_r,
                        -(pi_z/2)-.25]){
                color("cyan")
                cylinder (h=2*pi_z+.5, r=pi_screw_r,$fn=100);
            }
        
            translate([(-pi_x/2)+pi_screw_inset+pi_screw_r,
                        -(pi_y/2)+pi_screw_inset+pi_screw_r,
                        -(pi_z/2)-.25]){
                color("cyan")
                cylinder (h=2*pi_z+.5, r=pi_screw_r,$fn=100);
            }
        }
    }

    /*
     *  GPIO
     */
translate([(pi_x - pi_gpio_x)/2,pi_y-pi_gpio_y,pi_z]){
    color("black")
    cube([pi_gpio_x, pi_gpio_y, pi_gpio_z]);
}


    /*
     *      PORTS
     */
    translate([pi_x-6.75-pi_usb_x,-pi_usb_overhang,pi_board_z]){
        color("red")
        //USB Port 1
        cube([pi_usb_x,pi_usb_y,pi_usb_z]);
        translate([-pi_usb_x-4.55,0,0]){
            color("red")
            //USB Port 2
            cube([pi_usb_x,pi_usb_y,pi_usb_z]);
        }
    }

    translate([6.75,-pi_hdmi_overhang,pi_board_z]){
        color("green")
        //HDMI Port
        cube([pi_hdmi_x,pi_hdmi_y,pi_hdmi_z]);
    }
    
    translate([pi_x+pi_cam_overhang-pi_cam_x,(pi_y-pi_cam_y)/2,pi_board_z]){
        color("blue")
        //Camera Port
        cube([pi_cam_x,pi_cam_y,pi_cam_z]);
    }
    
    translate([-pi_sd_overhang,pi_sd_y_offset,pi_board_z]){
        color("purple")
        //MicroSD Port
        cube([pi_sd_x,pi_sd_y,pi_sd_z]);
    }
}
